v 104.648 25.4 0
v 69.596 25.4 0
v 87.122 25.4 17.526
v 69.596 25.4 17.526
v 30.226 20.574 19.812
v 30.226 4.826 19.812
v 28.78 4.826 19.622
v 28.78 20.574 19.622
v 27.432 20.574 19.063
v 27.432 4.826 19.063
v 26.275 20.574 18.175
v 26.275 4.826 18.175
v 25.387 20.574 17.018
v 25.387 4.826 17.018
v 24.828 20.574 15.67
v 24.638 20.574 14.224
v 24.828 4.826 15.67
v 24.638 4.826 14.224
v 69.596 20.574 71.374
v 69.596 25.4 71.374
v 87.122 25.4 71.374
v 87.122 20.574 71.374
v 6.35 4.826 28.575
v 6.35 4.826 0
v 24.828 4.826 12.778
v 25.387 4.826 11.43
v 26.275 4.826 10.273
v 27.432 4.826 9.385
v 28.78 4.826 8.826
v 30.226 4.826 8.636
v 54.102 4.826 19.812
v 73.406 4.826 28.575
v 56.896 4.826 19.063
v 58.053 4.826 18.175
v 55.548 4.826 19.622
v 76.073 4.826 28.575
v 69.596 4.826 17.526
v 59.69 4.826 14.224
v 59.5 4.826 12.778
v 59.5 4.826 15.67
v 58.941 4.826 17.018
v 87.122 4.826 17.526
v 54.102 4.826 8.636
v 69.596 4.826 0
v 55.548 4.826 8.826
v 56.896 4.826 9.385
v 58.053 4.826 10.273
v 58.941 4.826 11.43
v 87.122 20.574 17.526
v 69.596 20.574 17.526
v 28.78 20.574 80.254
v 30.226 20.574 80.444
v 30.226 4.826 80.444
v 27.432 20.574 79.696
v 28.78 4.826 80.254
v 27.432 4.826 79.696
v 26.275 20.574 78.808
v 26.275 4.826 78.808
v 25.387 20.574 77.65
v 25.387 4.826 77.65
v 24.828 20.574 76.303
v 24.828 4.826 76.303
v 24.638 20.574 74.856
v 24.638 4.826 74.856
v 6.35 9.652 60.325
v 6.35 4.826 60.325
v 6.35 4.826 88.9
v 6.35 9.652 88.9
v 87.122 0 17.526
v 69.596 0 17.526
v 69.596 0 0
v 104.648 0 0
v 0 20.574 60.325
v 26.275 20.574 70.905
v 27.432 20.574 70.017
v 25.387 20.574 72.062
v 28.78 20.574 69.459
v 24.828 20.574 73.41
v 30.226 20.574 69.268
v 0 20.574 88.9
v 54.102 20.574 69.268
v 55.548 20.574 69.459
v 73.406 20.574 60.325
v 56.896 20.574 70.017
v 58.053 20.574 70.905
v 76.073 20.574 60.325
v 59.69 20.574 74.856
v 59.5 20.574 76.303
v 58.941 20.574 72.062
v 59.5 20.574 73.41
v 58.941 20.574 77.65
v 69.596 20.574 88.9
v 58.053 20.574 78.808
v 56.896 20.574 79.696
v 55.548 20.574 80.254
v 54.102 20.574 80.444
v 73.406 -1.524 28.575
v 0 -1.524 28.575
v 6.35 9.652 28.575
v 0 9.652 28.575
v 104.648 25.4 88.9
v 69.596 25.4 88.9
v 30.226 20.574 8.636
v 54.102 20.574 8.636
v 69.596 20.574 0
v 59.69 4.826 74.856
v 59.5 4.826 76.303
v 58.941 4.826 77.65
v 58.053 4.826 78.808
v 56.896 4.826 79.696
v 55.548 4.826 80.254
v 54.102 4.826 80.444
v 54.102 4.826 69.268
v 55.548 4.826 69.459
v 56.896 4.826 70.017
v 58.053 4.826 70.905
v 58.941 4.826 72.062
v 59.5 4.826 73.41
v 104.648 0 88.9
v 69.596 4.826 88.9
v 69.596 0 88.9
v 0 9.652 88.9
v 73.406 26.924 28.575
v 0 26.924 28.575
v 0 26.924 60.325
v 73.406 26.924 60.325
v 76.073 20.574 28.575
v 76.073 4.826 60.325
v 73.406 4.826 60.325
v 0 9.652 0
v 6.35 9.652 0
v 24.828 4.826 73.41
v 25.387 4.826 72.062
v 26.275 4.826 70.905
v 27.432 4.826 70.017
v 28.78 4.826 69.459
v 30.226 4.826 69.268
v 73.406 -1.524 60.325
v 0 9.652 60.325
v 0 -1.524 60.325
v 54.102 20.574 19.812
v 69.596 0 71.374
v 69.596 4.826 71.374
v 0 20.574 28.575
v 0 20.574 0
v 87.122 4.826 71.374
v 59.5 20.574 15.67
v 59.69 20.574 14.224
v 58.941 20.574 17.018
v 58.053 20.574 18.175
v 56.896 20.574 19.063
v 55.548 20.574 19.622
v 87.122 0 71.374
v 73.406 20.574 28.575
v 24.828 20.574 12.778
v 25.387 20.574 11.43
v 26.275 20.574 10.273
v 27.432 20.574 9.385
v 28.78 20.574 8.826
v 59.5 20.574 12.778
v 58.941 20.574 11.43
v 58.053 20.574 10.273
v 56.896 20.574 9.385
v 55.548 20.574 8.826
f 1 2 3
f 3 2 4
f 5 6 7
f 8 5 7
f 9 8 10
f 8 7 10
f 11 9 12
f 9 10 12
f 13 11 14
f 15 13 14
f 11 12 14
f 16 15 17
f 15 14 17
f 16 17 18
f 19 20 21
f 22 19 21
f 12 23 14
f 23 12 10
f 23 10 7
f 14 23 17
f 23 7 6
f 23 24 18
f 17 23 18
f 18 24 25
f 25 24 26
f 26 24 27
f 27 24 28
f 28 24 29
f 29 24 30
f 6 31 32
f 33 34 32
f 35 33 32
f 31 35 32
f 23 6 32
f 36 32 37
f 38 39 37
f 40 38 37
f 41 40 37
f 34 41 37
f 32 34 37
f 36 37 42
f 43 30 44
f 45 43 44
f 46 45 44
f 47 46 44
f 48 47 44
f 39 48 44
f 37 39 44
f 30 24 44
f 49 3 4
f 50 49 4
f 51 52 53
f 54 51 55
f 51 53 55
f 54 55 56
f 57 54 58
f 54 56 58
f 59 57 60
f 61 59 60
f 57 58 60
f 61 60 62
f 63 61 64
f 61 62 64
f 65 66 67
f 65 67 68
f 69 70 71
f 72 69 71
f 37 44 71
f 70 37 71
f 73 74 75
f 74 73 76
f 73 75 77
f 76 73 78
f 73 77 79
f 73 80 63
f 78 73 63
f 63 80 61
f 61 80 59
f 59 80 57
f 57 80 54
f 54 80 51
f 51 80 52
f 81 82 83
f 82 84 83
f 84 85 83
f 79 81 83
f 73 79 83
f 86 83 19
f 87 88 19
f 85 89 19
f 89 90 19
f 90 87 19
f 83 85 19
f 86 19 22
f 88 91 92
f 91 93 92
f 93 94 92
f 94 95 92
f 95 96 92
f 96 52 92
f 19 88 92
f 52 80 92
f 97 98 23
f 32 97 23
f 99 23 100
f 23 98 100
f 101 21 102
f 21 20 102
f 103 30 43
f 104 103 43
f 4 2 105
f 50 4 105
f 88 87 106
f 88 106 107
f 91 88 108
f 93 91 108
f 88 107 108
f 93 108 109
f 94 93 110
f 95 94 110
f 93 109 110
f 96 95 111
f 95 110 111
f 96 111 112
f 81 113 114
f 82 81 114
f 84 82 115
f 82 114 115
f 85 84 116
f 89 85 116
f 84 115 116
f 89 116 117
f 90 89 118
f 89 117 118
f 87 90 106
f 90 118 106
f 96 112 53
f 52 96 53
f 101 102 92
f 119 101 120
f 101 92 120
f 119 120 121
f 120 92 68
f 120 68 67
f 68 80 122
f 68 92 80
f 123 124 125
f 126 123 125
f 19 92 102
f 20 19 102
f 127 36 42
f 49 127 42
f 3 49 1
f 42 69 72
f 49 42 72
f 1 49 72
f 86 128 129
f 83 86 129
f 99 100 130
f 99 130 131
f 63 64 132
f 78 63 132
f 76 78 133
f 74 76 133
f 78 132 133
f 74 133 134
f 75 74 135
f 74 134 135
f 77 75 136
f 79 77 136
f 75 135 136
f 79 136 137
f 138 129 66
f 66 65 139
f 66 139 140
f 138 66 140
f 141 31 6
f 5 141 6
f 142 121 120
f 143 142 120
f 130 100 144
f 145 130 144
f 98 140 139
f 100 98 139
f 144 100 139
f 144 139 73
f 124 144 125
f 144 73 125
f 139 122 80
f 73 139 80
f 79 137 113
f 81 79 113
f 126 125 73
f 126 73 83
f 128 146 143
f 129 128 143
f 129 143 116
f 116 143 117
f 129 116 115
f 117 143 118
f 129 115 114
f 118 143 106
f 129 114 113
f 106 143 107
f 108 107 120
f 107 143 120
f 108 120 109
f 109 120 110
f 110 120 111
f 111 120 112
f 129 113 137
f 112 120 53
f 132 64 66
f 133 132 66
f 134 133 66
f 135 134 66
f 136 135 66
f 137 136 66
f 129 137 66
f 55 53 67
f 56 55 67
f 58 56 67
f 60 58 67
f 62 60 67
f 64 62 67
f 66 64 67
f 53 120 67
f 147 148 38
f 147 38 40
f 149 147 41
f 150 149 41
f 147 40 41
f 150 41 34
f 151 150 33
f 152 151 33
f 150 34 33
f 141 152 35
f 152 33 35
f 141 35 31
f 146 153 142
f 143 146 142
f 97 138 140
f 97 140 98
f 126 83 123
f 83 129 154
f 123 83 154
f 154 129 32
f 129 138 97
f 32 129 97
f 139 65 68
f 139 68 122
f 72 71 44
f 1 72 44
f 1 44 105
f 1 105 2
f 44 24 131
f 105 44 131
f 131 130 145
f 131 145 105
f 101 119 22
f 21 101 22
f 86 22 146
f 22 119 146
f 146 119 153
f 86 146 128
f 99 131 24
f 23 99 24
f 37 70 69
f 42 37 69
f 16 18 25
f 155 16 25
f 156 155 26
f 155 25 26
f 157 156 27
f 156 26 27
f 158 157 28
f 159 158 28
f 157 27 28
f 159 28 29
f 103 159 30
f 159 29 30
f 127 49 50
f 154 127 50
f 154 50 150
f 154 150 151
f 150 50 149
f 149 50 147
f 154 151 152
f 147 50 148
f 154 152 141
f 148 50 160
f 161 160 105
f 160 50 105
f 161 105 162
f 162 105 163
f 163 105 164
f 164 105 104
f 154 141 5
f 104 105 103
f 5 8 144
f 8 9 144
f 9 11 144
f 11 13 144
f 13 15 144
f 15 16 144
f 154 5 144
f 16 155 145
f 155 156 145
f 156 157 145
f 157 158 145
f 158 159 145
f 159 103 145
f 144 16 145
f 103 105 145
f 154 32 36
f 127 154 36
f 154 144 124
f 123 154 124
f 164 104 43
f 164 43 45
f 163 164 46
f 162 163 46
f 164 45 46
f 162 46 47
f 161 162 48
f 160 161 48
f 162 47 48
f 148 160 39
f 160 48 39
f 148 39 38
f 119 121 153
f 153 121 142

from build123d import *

# Parameters (mm, degrees)
F1_DEPTH  = 104.648
F2_W      = 69.596
F2_H      = 4.826
F3_DEPTH  = 28.575
F2_W_2    = 31.242
F2_H_2    = 1.524
F4_DEPTH  = 150.7
F6_DEPTH  = 28.575
F8_DEPTH  = 26.925
F9_DEPTH  = 4.826
F11_DEPTH = 4.826
F13_DEPTH = 26.925


with BuildPart() as f1:
    # F0 (on Right) → F1 (new body)
    with BuildSketch(Plane.YZ):
        Polygon((0, 28.575), (0, 0), (25.4, 0), (25.4, 28.575), (26.924, 28.575), (26.924, 60.325), (25.4, 60.325), (25.4, 88.9), (0, 88.9), (0, 60.325), (-1.524, 60.325), (-1.524, 28.575), align=None)
    extrude(amount=F1_DEPTH)

    # F2 (on face) → F3 (cut)
    with BuildSketch(Plane.XY.offset(88.9)):
        with Locations((34.798, 22.987)):
            Rectangle(F2_W, F2_H)
        Polygon((0, 4.826), (0, 0), (69.596, 0), (69.596, 4.826), (6.35, 4.826), (6.35, 9.652), (0, 9.652), align=None)
    extrude(amount=-F3_DEPTH, mode=Mode.SUBTRACT)

    # F2 (on face) → F4 (cut)
    with BuildSketch(Plane.XY.offset(88.9)):
        with Locations((89.027, 26.162)):
            Rectangle(F2_W_2, F2_H_2)
        with Locations((89.027, -0.762)):
            Rectangle(F2_W_2, F2_H_2)
    extrude(amount=-F4_DEPTH, mode=Mode.SUBTRACT)

    # F5 (on face) → F6 (cut)
    with BuildSketch(Plane(origin=(0, 0, 0), x_dir=(1, 0, 0), z_dir=(0, 0, -1))):
        Polygon((6.35, -9.652), (6.35, -4.826), (69.596, -4.826), (69.596, 0), (73.406, 0), (73.406, 1.524), (0, 1.524), (0, -9.652), align=None)
        Polygon((69.596, -20.574), (0, -20.574), (0, -26.924), (73.406, -26.924), (73.406, -25.4), (69.596, -25.4), align=None)
    extrude(amount=-F6_DEPTH, mode=Mode.SUBTRACT)

    # F7 (on face) → F8 (cut, through all)
    with BuildSketch(Plane.XZ):
        Polygon((104.648, 44.45), (104.648, 88.9), (87.122, 71.374), (76.073, 60.325), (73.406, 60.325), (73.406, 44.45), align=None)
        Polygon((104.648, 0), (104.648, 44.45), (73.406, 44.45), (73.406, 28.575), (76.073, 28.575), (87.122, 17.526), align=None)
    extrude(amount=-F8_DEPTH, mode=Mode.SUBTRACT)

    # F7 (on face) → F9 (cut)
    with BuildSketch(Plane.XZ):
        Polygon((76.073, 60.325), (87.122, 71.374), (69.596, 71.374), (69.596, 60.325), (73.406, 60.325), align=None)
        Polygon((69.596, 17.526), (87.122, 17.526), (76.073, 28.575), (73.406, 28.575), (69.596, 28.575), align=None)
    extrude(amount=-F9_DEPTH, mode=Mode.SUBTRACT)

    # F10 (on face) → F11 (cut)
    with BuildSketch(Plane(origin=(0, 25.4, 0), x_dir=(-1, 0, 0), z_dir=(0, 1, 0))):
        Polygon((-69.596, 60.325), (-69.596, 71.374), (-87.122, 71.374), (-76.073, 60.325), (-73.406, 60.325), align=None)
        Polygon((-69.596, 17.526), (-69.596, 28.575), (-73.406, 28.575), (-76.073, 28.575), (-87.122, 17.526), align=None)
    extrude(amount=-F11_DEPTH, mode=Mode.SUBTRACT)

    # F12 (on face) → F13 (cut, through all)
    with BuildSketch(Plane.XZ):
        with BuildLine():
            ThreePointArc((30.226, 19.812), (26.2746873067, 18.1753126933), (24.638, 14.224))
            Line((24.638, 14.224), (30.226, 14.224))
            Line((30.226, 14.224), (35.814, 14.224))
            ThreePointArc((35.814, 14.224), (34.1773126933, 18.1753126933), (30.226, 19.812))
        make_face()
        with BuildLine():
            Line((30.226, 14.224), (24.638, 14.224))
            ThreePointArc((24.638, 14.224), (26.2746873067, 10.2726873067), (30.226, 8.636))
            ThreePointArc((30.226, 8.636), (34.1773126933, 10.2726873067), (35.814, 14.224))
            Line((35.814, 14.224), (30.226, 14.224))
        make_face()
        with BuildLine():
            Line((54.102, 19.812), (30.226, 19.812))
            ThreePointArc((30.226, 19.812), (34.1773126933, 18.1753126933), (35.814, 14.224))
            Line((35.814, 14.224), (48.514, 14.224))
            ThreePointArc((48.514, 14.224), (50.1506873067, 18.1753126933), (54.102, 19.812))
        make_face()
        with BuildLine():
            ThreePointArc((35.814, 14.224), (34.1773126933, 10.2726873067), (30.226, 8.636))
            Line((30.226, 8.636), (54.102, 8.636))
            ThreePointArc((54.102, 8.636), (50.1506873067, 10.2726873067), (48.514, 14.224))
            Line((48.514, 14.224), (35.814, 14.224))
        make_face()
        with BuildLine():
            ThreePointArc((59.69, 14.224), (58.0533126933, 18.1753126933), (54.102, 19.812))
            ThreePointArc((54.102, 19.812), (50.1506873067, 18.1753126933), (48.514, 14.224))
            Line((48.514, 14.224), (59.69, 14.224))
        make_face()
        with BuildLine():
            ThreePointArc((48.514, 14.224), (50.1506873067, 10.2726873067), (54.102, 8.636))
            ThreePointArc((54.102, 8.636), (58.0533126933, 10.2726873067), (59.69, 14.224))
            Line((59.69, 14.224), (48.514, 14.224))
        make_face()
        with BuildLine():
            Line((48.514, 74.856311358), (59.69, 74.856311358))
            ThreePointArc((59.69, 74.856311358), (58.0533126933, 78.8076240512), (54.102, 80.444311358))
            ThreePointArc((54.102, 80.444311358), (50.1506873067, 78.8076240512), (48.514, 74.856311358))
        make_face()
        with BuildLine():
            ThreePointArc((54.102, 69.268311358), (58.0533126933, 70.9049986647), (59.69, 74.856311358))
            Line((59.69, 74.856311358), (48.514, 74.856311358))
            ThreePointArc((48.514, 74.856311358), (50.1506873067, 70.9049986647), (54.102, 69.268311358))
        make_face()
        with BuildLine():
            ThreePointArc((48.514, 74.856311358), (50.1506873067, 78.8076240512), (54.102, 80.444311358))
            Line((54.102, 80.444311358), (30.226, 80.444311358))
            ThreePointArc((30.226, 80.444311358), (34.1773126933, 78.8076240512), (35.814, 74.856311358))
            Line((35.814, 74.856311358), (48.514, 74.856311358))
        make_face()
        with BuildLine():
            Line((30.226, 69.268311358), (54.102, 69.268311358))
            ThreePointArc((54.102, 69.268311358), (50.1506873067, 70.9049986647), (48.514, 74.856311358))
            Line((48.514, 74.856311358), (35.814, 74.856311358))
            ThreePointArc((35.814, 74.856311358), (34.1773126933, 70.9049986647), (30.226, 69.268311358))
        make_face()
        with BuildLine():
            ThreePointArc((35.814, 74.856311358), (34.1773126933, 78.8076240512), (30.226, 80.444311358))
            ThreePointArc((30.226, 80.444311358), (26.2746873067, 78.8076240512), (24.638, 74.856311358))
            Line((24.638, 74.856311358), (35.814, 74.856311358))
        make_face()
        with BuildLine():
            ThreePointArc((24.638, 74.856311358), (26.2746873067, 70.9049986647), (30.226, 69.268311358))
            ThreePointArc((30.226, 69.268311358), (34.1773126933, 70.9049986647), (35.814, 74.856311358))
            Line((35.814, 74.856311358), (24.638, 74.856311358))
        make_face()
    extrude(amount=-F13_DEPTH, mode=Mode.SUBTRACT)


solid = f1.part
